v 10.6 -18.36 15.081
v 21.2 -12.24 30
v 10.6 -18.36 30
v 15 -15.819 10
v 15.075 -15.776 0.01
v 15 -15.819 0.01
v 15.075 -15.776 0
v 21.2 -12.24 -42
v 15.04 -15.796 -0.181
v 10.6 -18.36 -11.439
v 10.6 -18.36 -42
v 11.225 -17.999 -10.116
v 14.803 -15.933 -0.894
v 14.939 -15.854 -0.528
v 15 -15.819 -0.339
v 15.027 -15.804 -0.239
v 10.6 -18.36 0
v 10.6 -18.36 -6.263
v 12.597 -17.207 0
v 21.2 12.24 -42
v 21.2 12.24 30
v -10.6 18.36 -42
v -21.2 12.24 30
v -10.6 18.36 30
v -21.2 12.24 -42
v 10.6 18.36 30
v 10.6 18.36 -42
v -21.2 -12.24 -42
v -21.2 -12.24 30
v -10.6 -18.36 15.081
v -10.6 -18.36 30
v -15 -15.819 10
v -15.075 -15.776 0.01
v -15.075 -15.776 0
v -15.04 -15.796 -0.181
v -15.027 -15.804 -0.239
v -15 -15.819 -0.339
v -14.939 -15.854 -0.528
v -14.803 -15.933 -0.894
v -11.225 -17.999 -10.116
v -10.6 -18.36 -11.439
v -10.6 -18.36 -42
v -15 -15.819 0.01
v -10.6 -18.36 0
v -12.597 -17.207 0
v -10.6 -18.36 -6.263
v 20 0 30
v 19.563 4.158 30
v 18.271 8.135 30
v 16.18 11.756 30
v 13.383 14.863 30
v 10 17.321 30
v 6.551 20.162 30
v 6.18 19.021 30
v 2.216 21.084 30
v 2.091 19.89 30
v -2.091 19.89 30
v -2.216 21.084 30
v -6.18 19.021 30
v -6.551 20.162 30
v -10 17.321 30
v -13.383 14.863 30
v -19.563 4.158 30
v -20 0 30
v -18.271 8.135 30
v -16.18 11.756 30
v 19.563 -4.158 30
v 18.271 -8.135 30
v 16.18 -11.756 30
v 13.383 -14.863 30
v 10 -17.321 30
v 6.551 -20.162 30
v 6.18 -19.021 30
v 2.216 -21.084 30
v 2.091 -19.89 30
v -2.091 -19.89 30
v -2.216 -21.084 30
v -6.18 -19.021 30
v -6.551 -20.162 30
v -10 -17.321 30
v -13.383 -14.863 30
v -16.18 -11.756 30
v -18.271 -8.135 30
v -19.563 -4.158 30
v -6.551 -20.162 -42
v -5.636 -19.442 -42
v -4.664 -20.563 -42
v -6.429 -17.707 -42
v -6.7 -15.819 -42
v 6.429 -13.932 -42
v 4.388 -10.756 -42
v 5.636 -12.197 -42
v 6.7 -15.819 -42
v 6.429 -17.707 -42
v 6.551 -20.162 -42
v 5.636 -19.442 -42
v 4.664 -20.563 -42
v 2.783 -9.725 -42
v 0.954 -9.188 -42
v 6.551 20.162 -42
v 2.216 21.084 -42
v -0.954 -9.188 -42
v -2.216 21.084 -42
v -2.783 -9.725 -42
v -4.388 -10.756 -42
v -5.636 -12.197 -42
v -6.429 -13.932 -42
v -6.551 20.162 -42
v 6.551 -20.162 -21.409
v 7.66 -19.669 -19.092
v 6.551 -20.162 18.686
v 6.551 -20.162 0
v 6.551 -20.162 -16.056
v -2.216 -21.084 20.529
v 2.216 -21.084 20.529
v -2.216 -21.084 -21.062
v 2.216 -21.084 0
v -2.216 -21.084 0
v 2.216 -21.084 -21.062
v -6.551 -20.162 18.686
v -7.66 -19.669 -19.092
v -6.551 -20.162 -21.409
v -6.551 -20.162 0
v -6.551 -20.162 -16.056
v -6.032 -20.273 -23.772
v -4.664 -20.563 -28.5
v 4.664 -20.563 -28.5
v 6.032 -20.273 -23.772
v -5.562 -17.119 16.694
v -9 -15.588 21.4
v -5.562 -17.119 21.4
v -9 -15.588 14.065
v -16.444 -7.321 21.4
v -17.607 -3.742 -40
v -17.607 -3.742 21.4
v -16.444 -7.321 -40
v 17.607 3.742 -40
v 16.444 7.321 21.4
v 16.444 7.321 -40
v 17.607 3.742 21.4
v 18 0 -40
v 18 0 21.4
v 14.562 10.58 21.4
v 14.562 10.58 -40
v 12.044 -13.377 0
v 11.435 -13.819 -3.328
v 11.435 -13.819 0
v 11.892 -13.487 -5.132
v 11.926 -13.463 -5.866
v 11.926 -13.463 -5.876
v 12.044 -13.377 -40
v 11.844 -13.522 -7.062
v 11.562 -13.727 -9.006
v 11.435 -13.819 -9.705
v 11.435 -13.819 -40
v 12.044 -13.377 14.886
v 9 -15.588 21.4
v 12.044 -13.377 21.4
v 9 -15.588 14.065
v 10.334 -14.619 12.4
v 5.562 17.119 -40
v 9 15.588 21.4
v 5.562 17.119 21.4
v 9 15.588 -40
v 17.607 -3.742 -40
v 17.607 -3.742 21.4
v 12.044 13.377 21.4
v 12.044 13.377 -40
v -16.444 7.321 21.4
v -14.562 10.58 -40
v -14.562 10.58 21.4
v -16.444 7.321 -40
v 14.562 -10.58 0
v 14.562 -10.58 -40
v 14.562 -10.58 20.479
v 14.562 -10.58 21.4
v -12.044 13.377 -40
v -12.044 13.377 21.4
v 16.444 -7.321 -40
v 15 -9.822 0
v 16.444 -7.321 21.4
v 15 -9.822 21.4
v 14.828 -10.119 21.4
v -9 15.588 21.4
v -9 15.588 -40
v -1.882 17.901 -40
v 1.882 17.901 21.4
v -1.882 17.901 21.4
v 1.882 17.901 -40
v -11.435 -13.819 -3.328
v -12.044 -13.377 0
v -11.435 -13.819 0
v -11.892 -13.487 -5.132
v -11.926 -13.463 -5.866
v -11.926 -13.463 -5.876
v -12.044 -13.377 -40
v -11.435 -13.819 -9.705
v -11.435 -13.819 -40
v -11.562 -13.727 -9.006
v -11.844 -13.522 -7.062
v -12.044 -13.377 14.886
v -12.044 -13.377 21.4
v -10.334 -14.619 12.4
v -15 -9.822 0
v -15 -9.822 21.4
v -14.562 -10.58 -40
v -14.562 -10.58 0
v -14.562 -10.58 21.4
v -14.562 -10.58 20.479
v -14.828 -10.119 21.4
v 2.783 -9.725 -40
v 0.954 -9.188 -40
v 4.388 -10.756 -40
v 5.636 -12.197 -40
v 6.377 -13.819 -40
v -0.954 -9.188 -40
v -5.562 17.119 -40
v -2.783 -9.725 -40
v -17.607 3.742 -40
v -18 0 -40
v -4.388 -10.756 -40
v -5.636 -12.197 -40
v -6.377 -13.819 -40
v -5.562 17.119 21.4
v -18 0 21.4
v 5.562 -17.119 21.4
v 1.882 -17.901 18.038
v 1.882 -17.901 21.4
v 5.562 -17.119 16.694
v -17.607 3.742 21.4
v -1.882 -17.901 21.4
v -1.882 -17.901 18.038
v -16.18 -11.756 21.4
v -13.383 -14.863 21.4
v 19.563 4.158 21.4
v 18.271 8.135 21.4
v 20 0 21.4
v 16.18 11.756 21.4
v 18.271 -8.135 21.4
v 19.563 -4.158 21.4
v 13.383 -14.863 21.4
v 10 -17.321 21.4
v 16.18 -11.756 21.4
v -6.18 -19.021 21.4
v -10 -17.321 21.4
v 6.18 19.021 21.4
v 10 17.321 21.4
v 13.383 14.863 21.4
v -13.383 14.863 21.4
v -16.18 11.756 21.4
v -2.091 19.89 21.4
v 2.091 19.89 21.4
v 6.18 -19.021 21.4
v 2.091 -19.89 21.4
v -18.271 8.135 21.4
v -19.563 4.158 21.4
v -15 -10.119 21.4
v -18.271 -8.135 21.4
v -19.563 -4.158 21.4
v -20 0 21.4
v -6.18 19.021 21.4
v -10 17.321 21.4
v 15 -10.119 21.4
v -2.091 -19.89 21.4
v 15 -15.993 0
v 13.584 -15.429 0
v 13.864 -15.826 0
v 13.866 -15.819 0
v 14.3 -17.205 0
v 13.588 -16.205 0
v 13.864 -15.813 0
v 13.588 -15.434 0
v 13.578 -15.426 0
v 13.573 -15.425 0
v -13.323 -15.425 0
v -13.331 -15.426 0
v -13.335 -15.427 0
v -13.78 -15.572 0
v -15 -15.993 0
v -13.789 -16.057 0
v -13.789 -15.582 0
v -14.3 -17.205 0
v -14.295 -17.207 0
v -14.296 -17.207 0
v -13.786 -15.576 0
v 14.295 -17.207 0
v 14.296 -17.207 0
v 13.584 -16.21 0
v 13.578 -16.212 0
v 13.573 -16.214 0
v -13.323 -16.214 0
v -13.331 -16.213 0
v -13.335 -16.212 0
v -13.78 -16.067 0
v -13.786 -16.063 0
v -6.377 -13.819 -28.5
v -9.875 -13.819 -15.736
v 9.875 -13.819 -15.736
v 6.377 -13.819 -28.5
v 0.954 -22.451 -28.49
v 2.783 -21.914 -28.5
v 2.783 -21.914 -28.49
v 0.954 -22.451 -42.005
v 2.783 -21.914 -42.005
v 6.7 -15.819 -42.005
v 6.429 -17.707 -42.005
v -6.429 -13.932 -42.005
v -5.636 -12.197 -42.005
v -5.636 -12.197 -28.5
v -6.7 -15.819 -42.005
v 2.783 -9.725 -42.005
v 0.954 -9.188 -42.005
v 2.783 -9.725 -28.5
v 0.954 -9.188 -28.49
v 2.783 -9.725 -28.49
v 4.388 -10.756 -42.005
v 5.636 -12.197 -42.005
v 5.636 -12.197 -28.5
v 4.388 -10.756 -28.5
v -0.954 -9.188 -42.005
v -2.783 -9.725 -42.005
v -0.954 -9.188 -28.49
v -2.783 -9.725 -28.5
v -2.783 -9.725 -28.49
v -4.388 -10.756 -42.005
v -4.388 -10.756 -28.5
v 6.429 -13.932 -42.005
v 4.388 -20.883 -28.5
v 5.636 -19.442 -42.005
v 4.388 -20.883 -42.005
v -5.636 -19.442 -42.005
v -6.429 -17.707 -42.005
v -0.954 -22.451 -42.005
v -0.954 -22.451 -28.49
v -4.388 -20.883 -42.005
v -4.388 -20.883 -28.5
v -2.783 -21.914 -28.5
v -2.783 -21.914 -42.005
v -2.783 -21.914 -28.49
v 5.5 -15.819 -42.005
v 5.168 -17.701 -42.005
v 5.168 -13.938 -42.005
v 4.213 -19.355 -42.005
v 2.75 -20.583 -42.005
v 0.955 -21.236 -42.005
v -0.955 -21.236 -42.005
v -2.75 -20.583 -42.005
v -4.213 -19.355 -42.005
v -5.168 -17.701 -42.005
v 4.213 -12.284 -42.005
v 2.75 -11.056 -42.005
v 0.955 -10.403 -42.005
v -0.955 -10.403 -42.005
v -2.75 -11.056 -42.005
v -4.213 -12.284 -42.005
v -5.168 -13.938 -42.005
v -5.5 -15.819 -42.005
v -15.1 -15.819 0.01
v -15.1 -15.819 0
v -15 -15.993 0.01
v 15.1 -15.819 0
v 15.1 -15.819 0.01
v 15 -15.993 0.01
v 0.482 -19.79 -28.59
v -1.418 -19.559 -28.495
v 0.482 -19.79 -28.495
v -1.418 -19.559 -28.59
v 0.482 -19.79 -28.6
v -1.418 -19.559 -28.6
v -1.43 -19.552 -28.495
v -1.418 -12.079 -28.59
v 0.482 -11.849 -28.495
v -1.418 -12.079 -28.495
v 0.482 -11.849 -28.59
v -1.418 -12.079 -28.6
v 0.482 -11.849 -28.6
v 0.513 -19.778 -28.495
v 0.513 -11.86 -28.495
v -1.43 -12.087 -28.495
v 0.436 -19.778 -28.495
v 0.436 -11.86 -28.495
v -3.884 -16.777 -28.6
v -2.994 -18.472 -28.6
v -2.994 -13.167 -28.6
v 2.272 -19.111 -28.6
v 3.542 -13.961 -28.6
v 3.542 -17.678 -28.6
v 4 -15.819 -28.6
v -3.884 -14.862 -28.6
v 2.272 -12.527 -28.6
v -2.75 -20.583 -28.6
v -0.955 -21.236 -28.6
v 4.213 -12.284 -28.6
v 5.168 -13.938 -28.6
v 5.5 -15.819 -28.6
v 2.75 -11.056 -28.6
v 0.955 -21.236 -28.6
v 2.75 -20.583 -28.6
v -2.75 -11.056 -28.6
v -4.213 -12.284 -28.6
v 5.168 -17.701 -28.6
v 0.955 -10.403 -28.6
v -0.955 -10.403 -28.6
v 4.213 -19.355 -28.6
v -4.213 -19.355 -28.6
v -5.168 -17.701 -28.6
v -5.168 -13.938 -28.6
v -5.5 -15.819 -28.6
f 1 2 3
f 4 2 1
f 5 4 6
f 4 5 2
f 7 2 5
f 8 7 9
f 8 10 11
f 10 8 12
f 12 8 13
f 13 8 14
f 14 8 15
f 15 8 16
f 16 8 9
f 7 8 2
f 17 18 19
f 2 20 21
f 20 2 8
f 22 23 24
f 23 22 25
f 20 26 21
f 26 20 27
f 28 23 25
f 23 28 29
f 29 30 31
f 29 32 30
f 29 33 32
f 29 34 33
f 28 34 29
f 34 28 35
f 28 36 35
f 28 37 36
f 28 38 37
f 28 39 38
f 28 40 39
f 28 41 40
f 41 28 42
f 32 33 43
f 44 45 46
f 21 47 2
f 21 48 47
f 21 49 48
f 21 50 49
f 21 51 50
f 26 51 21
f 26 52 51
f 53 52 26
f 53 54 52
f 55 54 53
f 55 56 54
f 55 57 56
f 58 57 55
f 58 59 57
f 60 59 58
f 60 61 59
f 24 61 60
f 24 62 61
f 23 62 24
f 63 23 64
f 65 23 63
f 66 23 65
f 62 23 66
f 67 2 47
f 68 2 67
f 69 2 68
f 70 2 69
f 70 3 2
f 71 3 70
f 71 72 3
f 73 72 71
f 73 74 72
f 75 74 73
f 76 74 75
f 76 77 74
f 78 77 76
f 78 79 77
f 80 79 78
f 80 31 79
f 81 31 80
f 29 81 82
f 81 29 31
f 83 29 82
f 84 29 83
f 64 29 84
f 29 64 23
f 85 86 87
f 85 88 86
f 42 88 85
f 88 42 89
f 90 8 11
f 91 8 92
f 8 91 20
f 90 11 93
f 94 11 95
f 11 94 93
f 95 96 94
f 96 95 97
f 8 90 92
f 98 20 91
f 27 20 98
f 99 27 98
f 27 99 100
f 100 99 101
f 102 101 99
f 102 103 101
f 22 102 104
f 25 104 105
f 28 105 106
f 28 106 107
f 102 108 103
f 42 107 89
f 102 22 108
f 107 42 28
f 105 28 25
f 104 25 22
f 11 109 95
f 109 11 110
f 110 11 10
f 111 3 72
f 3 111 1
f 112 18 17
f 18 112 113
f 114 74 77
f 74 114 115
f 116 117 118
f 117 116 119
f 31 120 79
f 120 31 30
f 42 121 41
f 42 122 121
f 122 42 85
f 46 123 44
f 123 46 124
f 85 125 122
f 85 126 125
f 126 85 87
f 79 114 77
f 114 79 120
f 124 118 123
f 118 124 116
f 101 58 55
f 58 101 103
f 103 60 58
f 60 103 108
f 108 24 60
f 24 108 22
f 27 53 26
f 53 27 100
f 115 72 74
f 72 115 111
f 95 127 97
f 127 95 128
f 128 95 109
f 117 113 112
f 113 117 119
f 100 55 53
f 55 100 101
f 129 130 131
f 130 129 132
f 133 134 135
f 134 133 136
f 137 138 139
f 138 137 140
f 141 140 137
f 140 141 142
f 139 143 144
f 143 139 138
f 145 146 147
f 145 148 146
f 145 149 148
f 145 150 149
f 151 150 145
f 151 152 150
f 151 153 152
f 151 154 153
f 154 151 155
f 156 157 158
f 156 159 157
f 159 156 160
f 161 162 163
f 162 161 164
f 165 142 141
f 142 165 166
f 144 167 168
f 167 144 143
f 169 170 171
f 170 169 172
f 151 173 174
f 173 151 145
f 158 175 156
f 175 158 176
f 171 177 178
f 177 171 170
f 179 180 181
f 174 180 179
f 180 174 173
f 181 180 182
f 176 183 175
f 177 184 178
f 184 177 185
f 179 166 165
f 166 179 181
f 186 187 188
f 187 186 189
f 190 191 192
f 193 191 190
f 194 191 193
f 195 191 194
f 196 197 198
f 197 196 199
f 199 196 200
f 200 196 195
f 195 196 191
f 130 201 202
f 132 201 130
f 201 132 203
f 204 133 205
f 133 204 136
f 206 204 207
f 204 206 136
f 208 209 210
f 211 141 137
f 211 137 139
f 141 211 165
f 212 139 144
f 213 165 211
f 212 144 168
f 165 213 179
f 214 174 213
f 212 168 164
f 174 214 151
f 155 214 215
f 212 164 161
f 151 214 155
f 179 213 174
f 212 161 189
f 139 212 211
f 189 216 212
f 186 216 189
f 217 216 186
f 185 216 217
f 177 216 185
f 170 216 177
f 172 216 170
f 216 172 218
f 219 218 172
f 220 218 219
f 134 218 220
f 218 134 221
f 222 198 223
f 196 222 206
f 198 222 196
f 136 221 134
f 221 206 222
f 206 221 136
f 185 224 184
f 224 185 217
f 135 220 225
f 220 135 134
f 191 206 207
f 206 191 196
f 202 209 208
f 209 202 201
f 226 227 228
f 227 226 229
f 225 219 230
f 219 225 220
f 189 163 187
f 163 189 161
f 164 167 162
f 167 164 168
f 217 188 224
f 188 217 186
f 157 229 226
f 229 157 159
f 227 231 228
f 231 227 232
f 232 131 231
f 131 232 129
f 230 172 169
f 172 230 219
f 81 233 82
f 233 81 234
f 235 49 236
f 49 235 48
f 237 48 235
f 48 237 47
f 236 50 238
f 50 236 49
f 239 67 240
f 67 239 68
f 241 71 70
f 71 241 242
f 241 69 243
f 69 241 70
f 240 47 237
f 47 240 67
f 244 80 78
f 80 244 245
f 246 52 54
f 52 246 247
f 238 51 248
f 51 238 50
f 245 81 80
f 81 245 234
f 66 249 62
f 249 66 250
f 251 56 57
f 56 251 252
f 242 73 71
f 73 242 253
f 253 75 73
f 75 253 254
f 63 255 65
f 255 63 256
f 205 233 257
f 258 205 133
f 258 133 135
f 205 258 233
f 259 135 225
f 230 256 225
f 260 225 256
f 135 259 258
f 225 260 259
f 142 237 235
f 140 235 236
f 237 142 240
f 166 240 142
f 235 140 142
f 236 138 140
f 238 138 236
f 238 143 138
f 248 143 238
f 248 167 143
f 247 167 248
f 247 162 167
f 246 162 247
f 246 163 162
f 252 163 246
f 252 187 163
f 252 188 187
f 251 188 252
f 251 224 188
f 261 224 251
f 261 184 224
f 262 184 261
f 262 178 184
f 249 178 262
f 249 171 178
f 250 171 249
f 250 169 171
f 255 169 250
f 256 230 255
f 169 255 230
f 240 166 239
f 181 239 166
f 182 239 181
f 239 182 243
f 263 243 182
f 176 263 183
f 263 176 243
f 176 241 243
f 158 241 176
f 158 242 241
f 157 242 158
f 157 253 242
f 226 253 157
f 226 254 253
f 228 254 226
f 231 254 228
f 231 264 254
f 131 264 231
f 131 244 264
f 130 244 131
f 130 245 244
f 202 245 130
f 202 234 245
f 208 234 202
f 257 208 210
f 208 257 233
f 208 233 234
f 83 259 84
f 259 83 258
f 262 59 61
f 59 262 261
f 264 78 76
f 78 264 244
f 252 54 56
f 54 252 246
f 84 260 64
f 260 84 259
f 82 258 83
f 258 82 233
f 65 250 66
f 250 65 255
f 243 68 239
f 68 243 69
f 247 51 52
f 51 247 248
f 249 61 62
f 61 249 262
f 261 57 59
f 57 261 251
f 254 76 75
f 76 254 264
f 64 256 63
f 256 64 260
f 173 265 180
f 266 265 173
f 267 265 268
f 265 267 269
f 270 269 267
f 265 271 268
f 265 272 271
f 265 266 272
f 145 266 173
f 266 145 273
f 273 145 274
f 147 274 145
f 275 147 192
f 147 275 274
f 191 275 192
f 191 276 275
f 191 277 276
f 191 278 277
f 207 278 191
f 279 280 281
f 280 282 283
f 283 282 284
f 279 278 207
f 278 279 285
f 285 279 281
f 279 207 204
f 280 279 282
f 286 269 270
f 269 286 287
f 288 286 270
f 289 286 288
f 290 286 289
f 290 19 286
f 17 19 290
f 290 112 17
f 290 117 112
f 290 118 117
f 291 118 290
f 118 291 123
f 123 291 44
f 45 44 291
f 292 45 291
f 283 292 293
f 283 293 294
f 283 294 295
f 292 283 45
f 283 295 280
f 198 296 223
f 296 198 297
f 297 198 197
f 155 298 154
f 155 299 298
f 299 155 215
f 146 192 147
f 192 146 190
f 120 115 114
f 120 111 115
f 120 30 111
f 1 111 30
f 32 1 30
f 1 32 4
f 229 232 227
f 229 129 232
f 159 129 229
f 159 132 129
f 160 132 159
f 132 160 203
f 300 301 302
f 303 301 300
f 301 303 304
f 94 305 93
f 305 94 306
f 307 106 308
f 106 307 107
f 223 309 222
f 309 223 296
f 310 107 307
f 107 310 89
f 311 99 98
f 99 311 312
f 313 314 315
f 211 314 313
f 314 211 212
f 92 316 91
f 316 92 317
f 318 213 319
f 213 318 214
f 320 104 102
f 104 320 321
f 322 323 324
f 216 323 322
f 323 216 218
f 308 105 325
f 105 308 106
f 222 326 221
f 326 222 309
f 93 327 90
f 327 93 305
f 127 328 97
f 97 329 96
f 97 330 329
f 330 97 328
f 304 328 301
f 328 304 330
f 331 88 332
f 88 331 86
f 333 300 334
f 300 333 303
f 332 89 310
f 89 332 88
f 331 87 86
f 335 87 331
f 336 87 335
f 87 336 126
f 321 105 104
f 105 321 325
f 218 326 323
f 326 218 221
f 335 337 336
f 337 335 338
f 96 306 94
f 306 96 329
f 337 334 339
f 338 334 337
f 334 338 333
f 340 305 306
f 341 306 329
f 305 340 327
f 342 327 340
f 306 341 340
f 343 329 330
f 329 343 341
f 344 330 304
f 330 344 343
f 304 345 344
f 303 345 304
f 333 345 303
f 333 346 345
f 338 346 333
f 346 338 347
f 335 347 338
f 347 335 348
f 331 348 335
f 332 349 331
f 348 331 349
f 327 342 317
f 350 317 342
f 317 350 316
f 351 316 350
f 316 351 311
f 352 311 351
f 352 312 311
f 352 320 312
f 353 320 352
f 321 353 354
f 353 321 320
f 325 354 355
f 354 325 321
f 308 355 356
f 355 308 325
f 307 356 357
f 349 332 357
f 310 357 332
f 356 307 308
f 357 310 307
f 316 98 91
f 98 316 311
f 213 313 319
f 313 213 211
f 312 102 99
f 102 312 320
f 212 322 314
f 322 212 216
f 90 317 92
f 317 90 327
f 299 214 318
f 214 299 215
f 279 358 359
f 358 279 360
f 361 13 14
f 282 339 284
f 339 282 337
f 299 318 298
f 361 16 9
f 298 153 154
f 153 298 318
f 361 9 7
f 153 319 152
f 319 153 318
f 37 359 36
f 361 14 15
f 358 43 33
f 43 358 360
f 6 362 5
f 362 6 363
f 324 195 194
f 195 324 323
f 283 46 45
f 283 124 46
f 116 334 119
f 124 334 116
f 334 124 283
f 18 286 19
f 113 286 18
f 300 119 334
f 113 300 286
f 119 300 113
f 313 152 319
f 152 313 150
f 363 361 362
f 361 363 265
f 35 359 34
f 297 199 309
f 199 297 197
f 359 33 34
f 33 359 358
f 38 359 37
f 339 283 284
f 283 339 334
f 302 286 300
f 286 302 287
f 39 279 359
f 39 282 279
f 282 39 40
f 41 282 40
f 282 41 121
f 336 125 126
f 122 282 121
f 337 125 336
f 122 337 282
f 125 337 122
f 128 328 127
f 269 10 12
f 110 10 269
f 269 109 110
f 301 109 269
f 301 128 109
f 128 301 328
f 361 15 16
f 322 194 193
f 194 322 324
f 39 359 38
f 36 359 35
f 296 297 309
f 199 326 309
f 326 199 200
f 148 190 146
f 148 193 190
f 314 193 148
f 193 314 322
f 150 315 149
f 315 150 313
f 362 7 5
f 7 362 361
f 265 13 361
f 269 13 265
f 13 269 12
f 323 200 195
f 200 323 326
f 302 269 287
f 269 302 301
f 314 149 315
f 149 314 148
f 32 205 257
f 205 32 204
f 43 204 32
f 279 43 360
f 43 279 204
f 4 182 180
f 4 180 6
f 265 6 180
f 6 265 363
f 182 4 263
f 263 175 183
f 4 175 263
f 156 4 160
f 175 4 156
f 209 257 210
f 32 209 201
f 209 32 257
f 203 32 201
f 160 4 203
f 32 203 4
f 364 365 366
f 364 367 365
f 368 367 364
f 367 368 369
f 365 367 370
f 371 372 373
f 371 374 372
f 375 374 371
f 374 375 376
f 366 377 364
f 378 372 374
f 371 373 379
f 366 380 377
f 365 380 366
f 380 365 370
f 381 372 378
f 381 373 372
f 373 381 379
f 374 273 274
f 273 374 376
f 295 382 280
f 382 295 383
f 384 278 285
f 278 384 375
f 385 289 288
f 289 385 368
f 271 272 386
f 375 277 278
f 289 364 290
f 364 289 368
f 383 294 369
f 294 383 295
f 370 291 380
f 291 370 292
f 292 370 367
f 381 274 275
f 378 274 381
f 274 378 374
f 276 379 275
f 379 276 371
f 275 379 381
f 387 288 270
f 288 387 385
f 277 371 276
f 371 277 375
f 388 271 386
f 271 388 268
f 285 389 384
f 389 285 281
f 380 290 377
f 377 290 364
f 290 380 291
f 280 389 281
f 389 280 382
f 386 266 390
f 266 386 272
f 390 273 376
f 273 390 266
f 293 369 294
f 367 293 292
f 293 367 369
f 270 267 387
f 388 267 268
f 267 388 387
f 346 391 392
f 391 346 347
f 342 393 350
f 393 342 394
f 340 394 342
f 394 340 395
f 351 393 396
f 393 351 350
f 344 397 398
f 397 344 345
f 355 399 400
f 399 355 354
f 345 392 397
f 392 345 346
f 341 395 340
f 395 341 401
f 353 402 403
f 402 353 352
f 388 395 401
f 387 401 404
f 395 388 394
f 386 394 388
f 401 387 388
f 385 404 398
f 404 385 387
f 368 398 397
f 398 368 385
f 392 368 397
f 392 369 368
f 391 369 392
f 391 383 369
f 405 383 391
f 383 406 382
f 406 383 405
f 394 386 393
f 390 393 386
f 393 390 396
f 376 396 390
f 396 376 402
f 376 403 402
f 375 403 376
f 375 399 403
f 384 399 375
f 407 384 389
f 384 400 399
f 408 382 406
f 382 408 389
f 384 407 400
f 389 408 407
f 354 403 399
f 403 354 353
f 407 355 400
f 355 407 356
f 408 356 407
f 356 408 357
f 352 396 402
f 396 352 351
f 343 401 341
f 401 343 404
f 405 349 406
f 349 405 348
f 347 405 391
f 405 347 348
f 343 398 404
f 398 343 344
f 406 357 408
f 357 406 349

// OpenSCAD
// file: OpenSCAD_support/straight_flue.scad
// straight loft and accesoires 

module curvedFlueLoft(upperDiameter, lowerDiameter, loftCeiling, loftFloor){
    union(){
        // tube
        hull(){
        	translate([0, airSupplyY, loftFloor]) 
                cylinder(h=0.01, d=lowerDiameter, center=true);
        	translate([0, airSupplyY, (ground + tubeInsert)])
                cylinder(h=0.01, d=lowerDiameter, center=true);
        }
        // straight flue
            hull(){
            translate ([labiumWidth*-0.45, airSupplyY, loftCeiling]) 
                cylinder (0.01, d=upperDiameter);
            translate ([labiumWidth*0.45, airSupplyY, loftCeiling]) 
                cylinder (0.01, d=upperDiameter);
            translate ([0, airSupplyY, (loftFloor + tubeInsert)]) 
                cylinder (0.01, d=lowerDiameter);
        };
    };
}

module outer_straight_flue(){
    curvedFlueLoft(    
        upperDiameter = (flueWidth + 2 * minWallThickness), 
        lowerDiameter = (outerTube + 2 * minWallThickness),
        loftCeiling = 0,
        loftFloor = ground
    );
}

module inner_straight_flue(){
    curvedFlueLoft(
        upperDiameter = flueWidth, 
        lowerDiameter = innerTube, 
        loftCeiling = 0.1, 
        loftFloor = (ground-0.1)
    ); 
}

module straight_flue_fill(){
    translate ([0, 0, ground])
        intersection(){
            cylinder(height, d=(outerDiameter + 2* minWallThickness));
            translate([labiumWidth*-0.5, airSupplyY - outerDiameter + minWallThickness + flueWidth, 0])
                cube([labiumWidth, outerDiameter, floorThickness + lengthFlue]);
        }   
}
// file: OpenSCAD_support/straight_labium.scad
// straight labium cut and accesoires

module straight_labium_cut(){
    intersection(){
        translate ([-labiumWidth/2,0,0])
            rotate([90, 0, 90])
                linear_extrude(labiumWidth, $fn=50) 
                    polygon(points = labium_polygon_points);
        translate([labiumWidth*-0.25, 2*airSupplyY - labiumWidth*0.25, 0]) 
            minkowski(){
                cube([labiumWidth/2, -2*airSupplyY, -2*airSupplyY]);
                cylinder(r=labiumWidth/4,h=-2*airSupplyY);
            }
    }
};

module straight_labium_fill(){
    intersection(){
        translate ([-labiumWidth/2,0,0])
            rotate([90, 0, 90])
                linear_extrude(labiumWidth, $fn=50) 
                    polygon(points = labium_plus_points);
        cylinder(outerDiameter/2, d=outerDiameter);
    }
}
// file: OpenSCAD_support/common.scad
module basicShape(height)
translate ([0, 0, ground]) union(){
    difference(){
	   	union(){
	        intersection(){
	            rotate ([0, 0, 30]) 
                    cylinder_outer(height, (outerDiameter*0.5+minWallThickness), 6);
	            translate ([0,0,(height/2)]) 
                    cube ([outerDiameter*2, (sqrt(3)*(outerDiameter*0.5+minWallThickness)), height], center = true);
	 	    };
	        cylinder(height, d=(outerDiameter + 2* minWallThickness)); 
	   	};
        union(){
        	translate ([0, 0, floorThickness]) 
                cylinder(height, d=innerDiameter, center=false);
        	translate ([0, 0, (height - pipeInsert)]) 
                cylinder(height, d=outerDiameter, center=false);
        };
    };
};

module cylinder_outer(height,radius,fn){  	//from https://en.wikibooks.org/wiki/OpenSCAD_User_Manual/undersized_circular_objects
   fudge = 1/cos(180/fn);
   cylinder(h=height,r=radius*fudge,$fn=fn);
}
   
module airSupplySpacer(){
    translate ([0, airSupplyY, (ground-0.1)]) 
    cylinder (tubeInsert, d=outerTube, center=false);
}
// main file
// flue pippe. work in progress.

include <OpenSCAD_support/common.scad>
include <OpenSCAD_support/straight_labium.scad>
include <OpenSCAD_support/straight_flue.scad>

// variables
outerDiameter = 40;
innerDiameter = 36;
labiumWidth = 30;
outCut = 10;
lengthFlue = 40; // coordinate this with the frequency
outerTube = 11;
innerTube = 8;
minWallThickness = 1.2;
floorThickness = 2;
flueWidth = 0.8;

// proportions, are most likely good like that
tubeInsert = outerTube + 2.5;       // length
pipeInsert = innerDiameter * 0.1 + 5; // length
height = floorThickness
    + lengthFlue
    + outCut 
    + outerDiameter *0.5; 
    
// calculations, don't touch in production use
labium_angle = labiumWidth * 360 / outerDiameter / PI;
ground = (lengthFlue + floorThickness)*-1;
soundingLength = height - pipeInsert - floorThickness;
airSupplyY = 1/cos(30) * (outerDiameter*-0.5 - minWallThickness) + labiumWidth * tan(30) * 0.5; 
labium_polygon_points = 
    [[0,0],
    [0, outCut - 2*airSupplyY],
    [airSupplyY, outCut],
    [2*airSupplyY, outCut - 2*airSupplyY],
    [2*airSupplyY,0]];
labium_plus_points = 
    [[2*airSupplyY, outCut - 2*airSupplyY],
    [airSupplyY + minWallThickness, outCut + 2*minWallThickness],
    [airSupplyY, outCut],];

// announcing sounding length
echo(str("the sounding length inside the model in mm: ", soundingLength));

// flueLength warning
if (lengthFlue < outerTube * 2)
    echo("lengthFlue is too short");

// labium width warning
if (labium_angle > 60)
    echo("regarding the labium width, you have the right file");
if (labium_angle < 60)
    echo("use narrow labium file");

// logic
difference(){
    union(){
        basicShape(height); 
        straight_flue_fill();
        straight_labium_fill();
        outer_straight_flue();
    };
    union(){
        straight_labium_cut();
        inner_straight_flue(); 
        airSupplySpacer();
    };
};
  
//rotate ([0,0,30])
//cylinder_outer(height, (outerDiameter*0.5+minWallThickness), 6);

echo(version = version());
